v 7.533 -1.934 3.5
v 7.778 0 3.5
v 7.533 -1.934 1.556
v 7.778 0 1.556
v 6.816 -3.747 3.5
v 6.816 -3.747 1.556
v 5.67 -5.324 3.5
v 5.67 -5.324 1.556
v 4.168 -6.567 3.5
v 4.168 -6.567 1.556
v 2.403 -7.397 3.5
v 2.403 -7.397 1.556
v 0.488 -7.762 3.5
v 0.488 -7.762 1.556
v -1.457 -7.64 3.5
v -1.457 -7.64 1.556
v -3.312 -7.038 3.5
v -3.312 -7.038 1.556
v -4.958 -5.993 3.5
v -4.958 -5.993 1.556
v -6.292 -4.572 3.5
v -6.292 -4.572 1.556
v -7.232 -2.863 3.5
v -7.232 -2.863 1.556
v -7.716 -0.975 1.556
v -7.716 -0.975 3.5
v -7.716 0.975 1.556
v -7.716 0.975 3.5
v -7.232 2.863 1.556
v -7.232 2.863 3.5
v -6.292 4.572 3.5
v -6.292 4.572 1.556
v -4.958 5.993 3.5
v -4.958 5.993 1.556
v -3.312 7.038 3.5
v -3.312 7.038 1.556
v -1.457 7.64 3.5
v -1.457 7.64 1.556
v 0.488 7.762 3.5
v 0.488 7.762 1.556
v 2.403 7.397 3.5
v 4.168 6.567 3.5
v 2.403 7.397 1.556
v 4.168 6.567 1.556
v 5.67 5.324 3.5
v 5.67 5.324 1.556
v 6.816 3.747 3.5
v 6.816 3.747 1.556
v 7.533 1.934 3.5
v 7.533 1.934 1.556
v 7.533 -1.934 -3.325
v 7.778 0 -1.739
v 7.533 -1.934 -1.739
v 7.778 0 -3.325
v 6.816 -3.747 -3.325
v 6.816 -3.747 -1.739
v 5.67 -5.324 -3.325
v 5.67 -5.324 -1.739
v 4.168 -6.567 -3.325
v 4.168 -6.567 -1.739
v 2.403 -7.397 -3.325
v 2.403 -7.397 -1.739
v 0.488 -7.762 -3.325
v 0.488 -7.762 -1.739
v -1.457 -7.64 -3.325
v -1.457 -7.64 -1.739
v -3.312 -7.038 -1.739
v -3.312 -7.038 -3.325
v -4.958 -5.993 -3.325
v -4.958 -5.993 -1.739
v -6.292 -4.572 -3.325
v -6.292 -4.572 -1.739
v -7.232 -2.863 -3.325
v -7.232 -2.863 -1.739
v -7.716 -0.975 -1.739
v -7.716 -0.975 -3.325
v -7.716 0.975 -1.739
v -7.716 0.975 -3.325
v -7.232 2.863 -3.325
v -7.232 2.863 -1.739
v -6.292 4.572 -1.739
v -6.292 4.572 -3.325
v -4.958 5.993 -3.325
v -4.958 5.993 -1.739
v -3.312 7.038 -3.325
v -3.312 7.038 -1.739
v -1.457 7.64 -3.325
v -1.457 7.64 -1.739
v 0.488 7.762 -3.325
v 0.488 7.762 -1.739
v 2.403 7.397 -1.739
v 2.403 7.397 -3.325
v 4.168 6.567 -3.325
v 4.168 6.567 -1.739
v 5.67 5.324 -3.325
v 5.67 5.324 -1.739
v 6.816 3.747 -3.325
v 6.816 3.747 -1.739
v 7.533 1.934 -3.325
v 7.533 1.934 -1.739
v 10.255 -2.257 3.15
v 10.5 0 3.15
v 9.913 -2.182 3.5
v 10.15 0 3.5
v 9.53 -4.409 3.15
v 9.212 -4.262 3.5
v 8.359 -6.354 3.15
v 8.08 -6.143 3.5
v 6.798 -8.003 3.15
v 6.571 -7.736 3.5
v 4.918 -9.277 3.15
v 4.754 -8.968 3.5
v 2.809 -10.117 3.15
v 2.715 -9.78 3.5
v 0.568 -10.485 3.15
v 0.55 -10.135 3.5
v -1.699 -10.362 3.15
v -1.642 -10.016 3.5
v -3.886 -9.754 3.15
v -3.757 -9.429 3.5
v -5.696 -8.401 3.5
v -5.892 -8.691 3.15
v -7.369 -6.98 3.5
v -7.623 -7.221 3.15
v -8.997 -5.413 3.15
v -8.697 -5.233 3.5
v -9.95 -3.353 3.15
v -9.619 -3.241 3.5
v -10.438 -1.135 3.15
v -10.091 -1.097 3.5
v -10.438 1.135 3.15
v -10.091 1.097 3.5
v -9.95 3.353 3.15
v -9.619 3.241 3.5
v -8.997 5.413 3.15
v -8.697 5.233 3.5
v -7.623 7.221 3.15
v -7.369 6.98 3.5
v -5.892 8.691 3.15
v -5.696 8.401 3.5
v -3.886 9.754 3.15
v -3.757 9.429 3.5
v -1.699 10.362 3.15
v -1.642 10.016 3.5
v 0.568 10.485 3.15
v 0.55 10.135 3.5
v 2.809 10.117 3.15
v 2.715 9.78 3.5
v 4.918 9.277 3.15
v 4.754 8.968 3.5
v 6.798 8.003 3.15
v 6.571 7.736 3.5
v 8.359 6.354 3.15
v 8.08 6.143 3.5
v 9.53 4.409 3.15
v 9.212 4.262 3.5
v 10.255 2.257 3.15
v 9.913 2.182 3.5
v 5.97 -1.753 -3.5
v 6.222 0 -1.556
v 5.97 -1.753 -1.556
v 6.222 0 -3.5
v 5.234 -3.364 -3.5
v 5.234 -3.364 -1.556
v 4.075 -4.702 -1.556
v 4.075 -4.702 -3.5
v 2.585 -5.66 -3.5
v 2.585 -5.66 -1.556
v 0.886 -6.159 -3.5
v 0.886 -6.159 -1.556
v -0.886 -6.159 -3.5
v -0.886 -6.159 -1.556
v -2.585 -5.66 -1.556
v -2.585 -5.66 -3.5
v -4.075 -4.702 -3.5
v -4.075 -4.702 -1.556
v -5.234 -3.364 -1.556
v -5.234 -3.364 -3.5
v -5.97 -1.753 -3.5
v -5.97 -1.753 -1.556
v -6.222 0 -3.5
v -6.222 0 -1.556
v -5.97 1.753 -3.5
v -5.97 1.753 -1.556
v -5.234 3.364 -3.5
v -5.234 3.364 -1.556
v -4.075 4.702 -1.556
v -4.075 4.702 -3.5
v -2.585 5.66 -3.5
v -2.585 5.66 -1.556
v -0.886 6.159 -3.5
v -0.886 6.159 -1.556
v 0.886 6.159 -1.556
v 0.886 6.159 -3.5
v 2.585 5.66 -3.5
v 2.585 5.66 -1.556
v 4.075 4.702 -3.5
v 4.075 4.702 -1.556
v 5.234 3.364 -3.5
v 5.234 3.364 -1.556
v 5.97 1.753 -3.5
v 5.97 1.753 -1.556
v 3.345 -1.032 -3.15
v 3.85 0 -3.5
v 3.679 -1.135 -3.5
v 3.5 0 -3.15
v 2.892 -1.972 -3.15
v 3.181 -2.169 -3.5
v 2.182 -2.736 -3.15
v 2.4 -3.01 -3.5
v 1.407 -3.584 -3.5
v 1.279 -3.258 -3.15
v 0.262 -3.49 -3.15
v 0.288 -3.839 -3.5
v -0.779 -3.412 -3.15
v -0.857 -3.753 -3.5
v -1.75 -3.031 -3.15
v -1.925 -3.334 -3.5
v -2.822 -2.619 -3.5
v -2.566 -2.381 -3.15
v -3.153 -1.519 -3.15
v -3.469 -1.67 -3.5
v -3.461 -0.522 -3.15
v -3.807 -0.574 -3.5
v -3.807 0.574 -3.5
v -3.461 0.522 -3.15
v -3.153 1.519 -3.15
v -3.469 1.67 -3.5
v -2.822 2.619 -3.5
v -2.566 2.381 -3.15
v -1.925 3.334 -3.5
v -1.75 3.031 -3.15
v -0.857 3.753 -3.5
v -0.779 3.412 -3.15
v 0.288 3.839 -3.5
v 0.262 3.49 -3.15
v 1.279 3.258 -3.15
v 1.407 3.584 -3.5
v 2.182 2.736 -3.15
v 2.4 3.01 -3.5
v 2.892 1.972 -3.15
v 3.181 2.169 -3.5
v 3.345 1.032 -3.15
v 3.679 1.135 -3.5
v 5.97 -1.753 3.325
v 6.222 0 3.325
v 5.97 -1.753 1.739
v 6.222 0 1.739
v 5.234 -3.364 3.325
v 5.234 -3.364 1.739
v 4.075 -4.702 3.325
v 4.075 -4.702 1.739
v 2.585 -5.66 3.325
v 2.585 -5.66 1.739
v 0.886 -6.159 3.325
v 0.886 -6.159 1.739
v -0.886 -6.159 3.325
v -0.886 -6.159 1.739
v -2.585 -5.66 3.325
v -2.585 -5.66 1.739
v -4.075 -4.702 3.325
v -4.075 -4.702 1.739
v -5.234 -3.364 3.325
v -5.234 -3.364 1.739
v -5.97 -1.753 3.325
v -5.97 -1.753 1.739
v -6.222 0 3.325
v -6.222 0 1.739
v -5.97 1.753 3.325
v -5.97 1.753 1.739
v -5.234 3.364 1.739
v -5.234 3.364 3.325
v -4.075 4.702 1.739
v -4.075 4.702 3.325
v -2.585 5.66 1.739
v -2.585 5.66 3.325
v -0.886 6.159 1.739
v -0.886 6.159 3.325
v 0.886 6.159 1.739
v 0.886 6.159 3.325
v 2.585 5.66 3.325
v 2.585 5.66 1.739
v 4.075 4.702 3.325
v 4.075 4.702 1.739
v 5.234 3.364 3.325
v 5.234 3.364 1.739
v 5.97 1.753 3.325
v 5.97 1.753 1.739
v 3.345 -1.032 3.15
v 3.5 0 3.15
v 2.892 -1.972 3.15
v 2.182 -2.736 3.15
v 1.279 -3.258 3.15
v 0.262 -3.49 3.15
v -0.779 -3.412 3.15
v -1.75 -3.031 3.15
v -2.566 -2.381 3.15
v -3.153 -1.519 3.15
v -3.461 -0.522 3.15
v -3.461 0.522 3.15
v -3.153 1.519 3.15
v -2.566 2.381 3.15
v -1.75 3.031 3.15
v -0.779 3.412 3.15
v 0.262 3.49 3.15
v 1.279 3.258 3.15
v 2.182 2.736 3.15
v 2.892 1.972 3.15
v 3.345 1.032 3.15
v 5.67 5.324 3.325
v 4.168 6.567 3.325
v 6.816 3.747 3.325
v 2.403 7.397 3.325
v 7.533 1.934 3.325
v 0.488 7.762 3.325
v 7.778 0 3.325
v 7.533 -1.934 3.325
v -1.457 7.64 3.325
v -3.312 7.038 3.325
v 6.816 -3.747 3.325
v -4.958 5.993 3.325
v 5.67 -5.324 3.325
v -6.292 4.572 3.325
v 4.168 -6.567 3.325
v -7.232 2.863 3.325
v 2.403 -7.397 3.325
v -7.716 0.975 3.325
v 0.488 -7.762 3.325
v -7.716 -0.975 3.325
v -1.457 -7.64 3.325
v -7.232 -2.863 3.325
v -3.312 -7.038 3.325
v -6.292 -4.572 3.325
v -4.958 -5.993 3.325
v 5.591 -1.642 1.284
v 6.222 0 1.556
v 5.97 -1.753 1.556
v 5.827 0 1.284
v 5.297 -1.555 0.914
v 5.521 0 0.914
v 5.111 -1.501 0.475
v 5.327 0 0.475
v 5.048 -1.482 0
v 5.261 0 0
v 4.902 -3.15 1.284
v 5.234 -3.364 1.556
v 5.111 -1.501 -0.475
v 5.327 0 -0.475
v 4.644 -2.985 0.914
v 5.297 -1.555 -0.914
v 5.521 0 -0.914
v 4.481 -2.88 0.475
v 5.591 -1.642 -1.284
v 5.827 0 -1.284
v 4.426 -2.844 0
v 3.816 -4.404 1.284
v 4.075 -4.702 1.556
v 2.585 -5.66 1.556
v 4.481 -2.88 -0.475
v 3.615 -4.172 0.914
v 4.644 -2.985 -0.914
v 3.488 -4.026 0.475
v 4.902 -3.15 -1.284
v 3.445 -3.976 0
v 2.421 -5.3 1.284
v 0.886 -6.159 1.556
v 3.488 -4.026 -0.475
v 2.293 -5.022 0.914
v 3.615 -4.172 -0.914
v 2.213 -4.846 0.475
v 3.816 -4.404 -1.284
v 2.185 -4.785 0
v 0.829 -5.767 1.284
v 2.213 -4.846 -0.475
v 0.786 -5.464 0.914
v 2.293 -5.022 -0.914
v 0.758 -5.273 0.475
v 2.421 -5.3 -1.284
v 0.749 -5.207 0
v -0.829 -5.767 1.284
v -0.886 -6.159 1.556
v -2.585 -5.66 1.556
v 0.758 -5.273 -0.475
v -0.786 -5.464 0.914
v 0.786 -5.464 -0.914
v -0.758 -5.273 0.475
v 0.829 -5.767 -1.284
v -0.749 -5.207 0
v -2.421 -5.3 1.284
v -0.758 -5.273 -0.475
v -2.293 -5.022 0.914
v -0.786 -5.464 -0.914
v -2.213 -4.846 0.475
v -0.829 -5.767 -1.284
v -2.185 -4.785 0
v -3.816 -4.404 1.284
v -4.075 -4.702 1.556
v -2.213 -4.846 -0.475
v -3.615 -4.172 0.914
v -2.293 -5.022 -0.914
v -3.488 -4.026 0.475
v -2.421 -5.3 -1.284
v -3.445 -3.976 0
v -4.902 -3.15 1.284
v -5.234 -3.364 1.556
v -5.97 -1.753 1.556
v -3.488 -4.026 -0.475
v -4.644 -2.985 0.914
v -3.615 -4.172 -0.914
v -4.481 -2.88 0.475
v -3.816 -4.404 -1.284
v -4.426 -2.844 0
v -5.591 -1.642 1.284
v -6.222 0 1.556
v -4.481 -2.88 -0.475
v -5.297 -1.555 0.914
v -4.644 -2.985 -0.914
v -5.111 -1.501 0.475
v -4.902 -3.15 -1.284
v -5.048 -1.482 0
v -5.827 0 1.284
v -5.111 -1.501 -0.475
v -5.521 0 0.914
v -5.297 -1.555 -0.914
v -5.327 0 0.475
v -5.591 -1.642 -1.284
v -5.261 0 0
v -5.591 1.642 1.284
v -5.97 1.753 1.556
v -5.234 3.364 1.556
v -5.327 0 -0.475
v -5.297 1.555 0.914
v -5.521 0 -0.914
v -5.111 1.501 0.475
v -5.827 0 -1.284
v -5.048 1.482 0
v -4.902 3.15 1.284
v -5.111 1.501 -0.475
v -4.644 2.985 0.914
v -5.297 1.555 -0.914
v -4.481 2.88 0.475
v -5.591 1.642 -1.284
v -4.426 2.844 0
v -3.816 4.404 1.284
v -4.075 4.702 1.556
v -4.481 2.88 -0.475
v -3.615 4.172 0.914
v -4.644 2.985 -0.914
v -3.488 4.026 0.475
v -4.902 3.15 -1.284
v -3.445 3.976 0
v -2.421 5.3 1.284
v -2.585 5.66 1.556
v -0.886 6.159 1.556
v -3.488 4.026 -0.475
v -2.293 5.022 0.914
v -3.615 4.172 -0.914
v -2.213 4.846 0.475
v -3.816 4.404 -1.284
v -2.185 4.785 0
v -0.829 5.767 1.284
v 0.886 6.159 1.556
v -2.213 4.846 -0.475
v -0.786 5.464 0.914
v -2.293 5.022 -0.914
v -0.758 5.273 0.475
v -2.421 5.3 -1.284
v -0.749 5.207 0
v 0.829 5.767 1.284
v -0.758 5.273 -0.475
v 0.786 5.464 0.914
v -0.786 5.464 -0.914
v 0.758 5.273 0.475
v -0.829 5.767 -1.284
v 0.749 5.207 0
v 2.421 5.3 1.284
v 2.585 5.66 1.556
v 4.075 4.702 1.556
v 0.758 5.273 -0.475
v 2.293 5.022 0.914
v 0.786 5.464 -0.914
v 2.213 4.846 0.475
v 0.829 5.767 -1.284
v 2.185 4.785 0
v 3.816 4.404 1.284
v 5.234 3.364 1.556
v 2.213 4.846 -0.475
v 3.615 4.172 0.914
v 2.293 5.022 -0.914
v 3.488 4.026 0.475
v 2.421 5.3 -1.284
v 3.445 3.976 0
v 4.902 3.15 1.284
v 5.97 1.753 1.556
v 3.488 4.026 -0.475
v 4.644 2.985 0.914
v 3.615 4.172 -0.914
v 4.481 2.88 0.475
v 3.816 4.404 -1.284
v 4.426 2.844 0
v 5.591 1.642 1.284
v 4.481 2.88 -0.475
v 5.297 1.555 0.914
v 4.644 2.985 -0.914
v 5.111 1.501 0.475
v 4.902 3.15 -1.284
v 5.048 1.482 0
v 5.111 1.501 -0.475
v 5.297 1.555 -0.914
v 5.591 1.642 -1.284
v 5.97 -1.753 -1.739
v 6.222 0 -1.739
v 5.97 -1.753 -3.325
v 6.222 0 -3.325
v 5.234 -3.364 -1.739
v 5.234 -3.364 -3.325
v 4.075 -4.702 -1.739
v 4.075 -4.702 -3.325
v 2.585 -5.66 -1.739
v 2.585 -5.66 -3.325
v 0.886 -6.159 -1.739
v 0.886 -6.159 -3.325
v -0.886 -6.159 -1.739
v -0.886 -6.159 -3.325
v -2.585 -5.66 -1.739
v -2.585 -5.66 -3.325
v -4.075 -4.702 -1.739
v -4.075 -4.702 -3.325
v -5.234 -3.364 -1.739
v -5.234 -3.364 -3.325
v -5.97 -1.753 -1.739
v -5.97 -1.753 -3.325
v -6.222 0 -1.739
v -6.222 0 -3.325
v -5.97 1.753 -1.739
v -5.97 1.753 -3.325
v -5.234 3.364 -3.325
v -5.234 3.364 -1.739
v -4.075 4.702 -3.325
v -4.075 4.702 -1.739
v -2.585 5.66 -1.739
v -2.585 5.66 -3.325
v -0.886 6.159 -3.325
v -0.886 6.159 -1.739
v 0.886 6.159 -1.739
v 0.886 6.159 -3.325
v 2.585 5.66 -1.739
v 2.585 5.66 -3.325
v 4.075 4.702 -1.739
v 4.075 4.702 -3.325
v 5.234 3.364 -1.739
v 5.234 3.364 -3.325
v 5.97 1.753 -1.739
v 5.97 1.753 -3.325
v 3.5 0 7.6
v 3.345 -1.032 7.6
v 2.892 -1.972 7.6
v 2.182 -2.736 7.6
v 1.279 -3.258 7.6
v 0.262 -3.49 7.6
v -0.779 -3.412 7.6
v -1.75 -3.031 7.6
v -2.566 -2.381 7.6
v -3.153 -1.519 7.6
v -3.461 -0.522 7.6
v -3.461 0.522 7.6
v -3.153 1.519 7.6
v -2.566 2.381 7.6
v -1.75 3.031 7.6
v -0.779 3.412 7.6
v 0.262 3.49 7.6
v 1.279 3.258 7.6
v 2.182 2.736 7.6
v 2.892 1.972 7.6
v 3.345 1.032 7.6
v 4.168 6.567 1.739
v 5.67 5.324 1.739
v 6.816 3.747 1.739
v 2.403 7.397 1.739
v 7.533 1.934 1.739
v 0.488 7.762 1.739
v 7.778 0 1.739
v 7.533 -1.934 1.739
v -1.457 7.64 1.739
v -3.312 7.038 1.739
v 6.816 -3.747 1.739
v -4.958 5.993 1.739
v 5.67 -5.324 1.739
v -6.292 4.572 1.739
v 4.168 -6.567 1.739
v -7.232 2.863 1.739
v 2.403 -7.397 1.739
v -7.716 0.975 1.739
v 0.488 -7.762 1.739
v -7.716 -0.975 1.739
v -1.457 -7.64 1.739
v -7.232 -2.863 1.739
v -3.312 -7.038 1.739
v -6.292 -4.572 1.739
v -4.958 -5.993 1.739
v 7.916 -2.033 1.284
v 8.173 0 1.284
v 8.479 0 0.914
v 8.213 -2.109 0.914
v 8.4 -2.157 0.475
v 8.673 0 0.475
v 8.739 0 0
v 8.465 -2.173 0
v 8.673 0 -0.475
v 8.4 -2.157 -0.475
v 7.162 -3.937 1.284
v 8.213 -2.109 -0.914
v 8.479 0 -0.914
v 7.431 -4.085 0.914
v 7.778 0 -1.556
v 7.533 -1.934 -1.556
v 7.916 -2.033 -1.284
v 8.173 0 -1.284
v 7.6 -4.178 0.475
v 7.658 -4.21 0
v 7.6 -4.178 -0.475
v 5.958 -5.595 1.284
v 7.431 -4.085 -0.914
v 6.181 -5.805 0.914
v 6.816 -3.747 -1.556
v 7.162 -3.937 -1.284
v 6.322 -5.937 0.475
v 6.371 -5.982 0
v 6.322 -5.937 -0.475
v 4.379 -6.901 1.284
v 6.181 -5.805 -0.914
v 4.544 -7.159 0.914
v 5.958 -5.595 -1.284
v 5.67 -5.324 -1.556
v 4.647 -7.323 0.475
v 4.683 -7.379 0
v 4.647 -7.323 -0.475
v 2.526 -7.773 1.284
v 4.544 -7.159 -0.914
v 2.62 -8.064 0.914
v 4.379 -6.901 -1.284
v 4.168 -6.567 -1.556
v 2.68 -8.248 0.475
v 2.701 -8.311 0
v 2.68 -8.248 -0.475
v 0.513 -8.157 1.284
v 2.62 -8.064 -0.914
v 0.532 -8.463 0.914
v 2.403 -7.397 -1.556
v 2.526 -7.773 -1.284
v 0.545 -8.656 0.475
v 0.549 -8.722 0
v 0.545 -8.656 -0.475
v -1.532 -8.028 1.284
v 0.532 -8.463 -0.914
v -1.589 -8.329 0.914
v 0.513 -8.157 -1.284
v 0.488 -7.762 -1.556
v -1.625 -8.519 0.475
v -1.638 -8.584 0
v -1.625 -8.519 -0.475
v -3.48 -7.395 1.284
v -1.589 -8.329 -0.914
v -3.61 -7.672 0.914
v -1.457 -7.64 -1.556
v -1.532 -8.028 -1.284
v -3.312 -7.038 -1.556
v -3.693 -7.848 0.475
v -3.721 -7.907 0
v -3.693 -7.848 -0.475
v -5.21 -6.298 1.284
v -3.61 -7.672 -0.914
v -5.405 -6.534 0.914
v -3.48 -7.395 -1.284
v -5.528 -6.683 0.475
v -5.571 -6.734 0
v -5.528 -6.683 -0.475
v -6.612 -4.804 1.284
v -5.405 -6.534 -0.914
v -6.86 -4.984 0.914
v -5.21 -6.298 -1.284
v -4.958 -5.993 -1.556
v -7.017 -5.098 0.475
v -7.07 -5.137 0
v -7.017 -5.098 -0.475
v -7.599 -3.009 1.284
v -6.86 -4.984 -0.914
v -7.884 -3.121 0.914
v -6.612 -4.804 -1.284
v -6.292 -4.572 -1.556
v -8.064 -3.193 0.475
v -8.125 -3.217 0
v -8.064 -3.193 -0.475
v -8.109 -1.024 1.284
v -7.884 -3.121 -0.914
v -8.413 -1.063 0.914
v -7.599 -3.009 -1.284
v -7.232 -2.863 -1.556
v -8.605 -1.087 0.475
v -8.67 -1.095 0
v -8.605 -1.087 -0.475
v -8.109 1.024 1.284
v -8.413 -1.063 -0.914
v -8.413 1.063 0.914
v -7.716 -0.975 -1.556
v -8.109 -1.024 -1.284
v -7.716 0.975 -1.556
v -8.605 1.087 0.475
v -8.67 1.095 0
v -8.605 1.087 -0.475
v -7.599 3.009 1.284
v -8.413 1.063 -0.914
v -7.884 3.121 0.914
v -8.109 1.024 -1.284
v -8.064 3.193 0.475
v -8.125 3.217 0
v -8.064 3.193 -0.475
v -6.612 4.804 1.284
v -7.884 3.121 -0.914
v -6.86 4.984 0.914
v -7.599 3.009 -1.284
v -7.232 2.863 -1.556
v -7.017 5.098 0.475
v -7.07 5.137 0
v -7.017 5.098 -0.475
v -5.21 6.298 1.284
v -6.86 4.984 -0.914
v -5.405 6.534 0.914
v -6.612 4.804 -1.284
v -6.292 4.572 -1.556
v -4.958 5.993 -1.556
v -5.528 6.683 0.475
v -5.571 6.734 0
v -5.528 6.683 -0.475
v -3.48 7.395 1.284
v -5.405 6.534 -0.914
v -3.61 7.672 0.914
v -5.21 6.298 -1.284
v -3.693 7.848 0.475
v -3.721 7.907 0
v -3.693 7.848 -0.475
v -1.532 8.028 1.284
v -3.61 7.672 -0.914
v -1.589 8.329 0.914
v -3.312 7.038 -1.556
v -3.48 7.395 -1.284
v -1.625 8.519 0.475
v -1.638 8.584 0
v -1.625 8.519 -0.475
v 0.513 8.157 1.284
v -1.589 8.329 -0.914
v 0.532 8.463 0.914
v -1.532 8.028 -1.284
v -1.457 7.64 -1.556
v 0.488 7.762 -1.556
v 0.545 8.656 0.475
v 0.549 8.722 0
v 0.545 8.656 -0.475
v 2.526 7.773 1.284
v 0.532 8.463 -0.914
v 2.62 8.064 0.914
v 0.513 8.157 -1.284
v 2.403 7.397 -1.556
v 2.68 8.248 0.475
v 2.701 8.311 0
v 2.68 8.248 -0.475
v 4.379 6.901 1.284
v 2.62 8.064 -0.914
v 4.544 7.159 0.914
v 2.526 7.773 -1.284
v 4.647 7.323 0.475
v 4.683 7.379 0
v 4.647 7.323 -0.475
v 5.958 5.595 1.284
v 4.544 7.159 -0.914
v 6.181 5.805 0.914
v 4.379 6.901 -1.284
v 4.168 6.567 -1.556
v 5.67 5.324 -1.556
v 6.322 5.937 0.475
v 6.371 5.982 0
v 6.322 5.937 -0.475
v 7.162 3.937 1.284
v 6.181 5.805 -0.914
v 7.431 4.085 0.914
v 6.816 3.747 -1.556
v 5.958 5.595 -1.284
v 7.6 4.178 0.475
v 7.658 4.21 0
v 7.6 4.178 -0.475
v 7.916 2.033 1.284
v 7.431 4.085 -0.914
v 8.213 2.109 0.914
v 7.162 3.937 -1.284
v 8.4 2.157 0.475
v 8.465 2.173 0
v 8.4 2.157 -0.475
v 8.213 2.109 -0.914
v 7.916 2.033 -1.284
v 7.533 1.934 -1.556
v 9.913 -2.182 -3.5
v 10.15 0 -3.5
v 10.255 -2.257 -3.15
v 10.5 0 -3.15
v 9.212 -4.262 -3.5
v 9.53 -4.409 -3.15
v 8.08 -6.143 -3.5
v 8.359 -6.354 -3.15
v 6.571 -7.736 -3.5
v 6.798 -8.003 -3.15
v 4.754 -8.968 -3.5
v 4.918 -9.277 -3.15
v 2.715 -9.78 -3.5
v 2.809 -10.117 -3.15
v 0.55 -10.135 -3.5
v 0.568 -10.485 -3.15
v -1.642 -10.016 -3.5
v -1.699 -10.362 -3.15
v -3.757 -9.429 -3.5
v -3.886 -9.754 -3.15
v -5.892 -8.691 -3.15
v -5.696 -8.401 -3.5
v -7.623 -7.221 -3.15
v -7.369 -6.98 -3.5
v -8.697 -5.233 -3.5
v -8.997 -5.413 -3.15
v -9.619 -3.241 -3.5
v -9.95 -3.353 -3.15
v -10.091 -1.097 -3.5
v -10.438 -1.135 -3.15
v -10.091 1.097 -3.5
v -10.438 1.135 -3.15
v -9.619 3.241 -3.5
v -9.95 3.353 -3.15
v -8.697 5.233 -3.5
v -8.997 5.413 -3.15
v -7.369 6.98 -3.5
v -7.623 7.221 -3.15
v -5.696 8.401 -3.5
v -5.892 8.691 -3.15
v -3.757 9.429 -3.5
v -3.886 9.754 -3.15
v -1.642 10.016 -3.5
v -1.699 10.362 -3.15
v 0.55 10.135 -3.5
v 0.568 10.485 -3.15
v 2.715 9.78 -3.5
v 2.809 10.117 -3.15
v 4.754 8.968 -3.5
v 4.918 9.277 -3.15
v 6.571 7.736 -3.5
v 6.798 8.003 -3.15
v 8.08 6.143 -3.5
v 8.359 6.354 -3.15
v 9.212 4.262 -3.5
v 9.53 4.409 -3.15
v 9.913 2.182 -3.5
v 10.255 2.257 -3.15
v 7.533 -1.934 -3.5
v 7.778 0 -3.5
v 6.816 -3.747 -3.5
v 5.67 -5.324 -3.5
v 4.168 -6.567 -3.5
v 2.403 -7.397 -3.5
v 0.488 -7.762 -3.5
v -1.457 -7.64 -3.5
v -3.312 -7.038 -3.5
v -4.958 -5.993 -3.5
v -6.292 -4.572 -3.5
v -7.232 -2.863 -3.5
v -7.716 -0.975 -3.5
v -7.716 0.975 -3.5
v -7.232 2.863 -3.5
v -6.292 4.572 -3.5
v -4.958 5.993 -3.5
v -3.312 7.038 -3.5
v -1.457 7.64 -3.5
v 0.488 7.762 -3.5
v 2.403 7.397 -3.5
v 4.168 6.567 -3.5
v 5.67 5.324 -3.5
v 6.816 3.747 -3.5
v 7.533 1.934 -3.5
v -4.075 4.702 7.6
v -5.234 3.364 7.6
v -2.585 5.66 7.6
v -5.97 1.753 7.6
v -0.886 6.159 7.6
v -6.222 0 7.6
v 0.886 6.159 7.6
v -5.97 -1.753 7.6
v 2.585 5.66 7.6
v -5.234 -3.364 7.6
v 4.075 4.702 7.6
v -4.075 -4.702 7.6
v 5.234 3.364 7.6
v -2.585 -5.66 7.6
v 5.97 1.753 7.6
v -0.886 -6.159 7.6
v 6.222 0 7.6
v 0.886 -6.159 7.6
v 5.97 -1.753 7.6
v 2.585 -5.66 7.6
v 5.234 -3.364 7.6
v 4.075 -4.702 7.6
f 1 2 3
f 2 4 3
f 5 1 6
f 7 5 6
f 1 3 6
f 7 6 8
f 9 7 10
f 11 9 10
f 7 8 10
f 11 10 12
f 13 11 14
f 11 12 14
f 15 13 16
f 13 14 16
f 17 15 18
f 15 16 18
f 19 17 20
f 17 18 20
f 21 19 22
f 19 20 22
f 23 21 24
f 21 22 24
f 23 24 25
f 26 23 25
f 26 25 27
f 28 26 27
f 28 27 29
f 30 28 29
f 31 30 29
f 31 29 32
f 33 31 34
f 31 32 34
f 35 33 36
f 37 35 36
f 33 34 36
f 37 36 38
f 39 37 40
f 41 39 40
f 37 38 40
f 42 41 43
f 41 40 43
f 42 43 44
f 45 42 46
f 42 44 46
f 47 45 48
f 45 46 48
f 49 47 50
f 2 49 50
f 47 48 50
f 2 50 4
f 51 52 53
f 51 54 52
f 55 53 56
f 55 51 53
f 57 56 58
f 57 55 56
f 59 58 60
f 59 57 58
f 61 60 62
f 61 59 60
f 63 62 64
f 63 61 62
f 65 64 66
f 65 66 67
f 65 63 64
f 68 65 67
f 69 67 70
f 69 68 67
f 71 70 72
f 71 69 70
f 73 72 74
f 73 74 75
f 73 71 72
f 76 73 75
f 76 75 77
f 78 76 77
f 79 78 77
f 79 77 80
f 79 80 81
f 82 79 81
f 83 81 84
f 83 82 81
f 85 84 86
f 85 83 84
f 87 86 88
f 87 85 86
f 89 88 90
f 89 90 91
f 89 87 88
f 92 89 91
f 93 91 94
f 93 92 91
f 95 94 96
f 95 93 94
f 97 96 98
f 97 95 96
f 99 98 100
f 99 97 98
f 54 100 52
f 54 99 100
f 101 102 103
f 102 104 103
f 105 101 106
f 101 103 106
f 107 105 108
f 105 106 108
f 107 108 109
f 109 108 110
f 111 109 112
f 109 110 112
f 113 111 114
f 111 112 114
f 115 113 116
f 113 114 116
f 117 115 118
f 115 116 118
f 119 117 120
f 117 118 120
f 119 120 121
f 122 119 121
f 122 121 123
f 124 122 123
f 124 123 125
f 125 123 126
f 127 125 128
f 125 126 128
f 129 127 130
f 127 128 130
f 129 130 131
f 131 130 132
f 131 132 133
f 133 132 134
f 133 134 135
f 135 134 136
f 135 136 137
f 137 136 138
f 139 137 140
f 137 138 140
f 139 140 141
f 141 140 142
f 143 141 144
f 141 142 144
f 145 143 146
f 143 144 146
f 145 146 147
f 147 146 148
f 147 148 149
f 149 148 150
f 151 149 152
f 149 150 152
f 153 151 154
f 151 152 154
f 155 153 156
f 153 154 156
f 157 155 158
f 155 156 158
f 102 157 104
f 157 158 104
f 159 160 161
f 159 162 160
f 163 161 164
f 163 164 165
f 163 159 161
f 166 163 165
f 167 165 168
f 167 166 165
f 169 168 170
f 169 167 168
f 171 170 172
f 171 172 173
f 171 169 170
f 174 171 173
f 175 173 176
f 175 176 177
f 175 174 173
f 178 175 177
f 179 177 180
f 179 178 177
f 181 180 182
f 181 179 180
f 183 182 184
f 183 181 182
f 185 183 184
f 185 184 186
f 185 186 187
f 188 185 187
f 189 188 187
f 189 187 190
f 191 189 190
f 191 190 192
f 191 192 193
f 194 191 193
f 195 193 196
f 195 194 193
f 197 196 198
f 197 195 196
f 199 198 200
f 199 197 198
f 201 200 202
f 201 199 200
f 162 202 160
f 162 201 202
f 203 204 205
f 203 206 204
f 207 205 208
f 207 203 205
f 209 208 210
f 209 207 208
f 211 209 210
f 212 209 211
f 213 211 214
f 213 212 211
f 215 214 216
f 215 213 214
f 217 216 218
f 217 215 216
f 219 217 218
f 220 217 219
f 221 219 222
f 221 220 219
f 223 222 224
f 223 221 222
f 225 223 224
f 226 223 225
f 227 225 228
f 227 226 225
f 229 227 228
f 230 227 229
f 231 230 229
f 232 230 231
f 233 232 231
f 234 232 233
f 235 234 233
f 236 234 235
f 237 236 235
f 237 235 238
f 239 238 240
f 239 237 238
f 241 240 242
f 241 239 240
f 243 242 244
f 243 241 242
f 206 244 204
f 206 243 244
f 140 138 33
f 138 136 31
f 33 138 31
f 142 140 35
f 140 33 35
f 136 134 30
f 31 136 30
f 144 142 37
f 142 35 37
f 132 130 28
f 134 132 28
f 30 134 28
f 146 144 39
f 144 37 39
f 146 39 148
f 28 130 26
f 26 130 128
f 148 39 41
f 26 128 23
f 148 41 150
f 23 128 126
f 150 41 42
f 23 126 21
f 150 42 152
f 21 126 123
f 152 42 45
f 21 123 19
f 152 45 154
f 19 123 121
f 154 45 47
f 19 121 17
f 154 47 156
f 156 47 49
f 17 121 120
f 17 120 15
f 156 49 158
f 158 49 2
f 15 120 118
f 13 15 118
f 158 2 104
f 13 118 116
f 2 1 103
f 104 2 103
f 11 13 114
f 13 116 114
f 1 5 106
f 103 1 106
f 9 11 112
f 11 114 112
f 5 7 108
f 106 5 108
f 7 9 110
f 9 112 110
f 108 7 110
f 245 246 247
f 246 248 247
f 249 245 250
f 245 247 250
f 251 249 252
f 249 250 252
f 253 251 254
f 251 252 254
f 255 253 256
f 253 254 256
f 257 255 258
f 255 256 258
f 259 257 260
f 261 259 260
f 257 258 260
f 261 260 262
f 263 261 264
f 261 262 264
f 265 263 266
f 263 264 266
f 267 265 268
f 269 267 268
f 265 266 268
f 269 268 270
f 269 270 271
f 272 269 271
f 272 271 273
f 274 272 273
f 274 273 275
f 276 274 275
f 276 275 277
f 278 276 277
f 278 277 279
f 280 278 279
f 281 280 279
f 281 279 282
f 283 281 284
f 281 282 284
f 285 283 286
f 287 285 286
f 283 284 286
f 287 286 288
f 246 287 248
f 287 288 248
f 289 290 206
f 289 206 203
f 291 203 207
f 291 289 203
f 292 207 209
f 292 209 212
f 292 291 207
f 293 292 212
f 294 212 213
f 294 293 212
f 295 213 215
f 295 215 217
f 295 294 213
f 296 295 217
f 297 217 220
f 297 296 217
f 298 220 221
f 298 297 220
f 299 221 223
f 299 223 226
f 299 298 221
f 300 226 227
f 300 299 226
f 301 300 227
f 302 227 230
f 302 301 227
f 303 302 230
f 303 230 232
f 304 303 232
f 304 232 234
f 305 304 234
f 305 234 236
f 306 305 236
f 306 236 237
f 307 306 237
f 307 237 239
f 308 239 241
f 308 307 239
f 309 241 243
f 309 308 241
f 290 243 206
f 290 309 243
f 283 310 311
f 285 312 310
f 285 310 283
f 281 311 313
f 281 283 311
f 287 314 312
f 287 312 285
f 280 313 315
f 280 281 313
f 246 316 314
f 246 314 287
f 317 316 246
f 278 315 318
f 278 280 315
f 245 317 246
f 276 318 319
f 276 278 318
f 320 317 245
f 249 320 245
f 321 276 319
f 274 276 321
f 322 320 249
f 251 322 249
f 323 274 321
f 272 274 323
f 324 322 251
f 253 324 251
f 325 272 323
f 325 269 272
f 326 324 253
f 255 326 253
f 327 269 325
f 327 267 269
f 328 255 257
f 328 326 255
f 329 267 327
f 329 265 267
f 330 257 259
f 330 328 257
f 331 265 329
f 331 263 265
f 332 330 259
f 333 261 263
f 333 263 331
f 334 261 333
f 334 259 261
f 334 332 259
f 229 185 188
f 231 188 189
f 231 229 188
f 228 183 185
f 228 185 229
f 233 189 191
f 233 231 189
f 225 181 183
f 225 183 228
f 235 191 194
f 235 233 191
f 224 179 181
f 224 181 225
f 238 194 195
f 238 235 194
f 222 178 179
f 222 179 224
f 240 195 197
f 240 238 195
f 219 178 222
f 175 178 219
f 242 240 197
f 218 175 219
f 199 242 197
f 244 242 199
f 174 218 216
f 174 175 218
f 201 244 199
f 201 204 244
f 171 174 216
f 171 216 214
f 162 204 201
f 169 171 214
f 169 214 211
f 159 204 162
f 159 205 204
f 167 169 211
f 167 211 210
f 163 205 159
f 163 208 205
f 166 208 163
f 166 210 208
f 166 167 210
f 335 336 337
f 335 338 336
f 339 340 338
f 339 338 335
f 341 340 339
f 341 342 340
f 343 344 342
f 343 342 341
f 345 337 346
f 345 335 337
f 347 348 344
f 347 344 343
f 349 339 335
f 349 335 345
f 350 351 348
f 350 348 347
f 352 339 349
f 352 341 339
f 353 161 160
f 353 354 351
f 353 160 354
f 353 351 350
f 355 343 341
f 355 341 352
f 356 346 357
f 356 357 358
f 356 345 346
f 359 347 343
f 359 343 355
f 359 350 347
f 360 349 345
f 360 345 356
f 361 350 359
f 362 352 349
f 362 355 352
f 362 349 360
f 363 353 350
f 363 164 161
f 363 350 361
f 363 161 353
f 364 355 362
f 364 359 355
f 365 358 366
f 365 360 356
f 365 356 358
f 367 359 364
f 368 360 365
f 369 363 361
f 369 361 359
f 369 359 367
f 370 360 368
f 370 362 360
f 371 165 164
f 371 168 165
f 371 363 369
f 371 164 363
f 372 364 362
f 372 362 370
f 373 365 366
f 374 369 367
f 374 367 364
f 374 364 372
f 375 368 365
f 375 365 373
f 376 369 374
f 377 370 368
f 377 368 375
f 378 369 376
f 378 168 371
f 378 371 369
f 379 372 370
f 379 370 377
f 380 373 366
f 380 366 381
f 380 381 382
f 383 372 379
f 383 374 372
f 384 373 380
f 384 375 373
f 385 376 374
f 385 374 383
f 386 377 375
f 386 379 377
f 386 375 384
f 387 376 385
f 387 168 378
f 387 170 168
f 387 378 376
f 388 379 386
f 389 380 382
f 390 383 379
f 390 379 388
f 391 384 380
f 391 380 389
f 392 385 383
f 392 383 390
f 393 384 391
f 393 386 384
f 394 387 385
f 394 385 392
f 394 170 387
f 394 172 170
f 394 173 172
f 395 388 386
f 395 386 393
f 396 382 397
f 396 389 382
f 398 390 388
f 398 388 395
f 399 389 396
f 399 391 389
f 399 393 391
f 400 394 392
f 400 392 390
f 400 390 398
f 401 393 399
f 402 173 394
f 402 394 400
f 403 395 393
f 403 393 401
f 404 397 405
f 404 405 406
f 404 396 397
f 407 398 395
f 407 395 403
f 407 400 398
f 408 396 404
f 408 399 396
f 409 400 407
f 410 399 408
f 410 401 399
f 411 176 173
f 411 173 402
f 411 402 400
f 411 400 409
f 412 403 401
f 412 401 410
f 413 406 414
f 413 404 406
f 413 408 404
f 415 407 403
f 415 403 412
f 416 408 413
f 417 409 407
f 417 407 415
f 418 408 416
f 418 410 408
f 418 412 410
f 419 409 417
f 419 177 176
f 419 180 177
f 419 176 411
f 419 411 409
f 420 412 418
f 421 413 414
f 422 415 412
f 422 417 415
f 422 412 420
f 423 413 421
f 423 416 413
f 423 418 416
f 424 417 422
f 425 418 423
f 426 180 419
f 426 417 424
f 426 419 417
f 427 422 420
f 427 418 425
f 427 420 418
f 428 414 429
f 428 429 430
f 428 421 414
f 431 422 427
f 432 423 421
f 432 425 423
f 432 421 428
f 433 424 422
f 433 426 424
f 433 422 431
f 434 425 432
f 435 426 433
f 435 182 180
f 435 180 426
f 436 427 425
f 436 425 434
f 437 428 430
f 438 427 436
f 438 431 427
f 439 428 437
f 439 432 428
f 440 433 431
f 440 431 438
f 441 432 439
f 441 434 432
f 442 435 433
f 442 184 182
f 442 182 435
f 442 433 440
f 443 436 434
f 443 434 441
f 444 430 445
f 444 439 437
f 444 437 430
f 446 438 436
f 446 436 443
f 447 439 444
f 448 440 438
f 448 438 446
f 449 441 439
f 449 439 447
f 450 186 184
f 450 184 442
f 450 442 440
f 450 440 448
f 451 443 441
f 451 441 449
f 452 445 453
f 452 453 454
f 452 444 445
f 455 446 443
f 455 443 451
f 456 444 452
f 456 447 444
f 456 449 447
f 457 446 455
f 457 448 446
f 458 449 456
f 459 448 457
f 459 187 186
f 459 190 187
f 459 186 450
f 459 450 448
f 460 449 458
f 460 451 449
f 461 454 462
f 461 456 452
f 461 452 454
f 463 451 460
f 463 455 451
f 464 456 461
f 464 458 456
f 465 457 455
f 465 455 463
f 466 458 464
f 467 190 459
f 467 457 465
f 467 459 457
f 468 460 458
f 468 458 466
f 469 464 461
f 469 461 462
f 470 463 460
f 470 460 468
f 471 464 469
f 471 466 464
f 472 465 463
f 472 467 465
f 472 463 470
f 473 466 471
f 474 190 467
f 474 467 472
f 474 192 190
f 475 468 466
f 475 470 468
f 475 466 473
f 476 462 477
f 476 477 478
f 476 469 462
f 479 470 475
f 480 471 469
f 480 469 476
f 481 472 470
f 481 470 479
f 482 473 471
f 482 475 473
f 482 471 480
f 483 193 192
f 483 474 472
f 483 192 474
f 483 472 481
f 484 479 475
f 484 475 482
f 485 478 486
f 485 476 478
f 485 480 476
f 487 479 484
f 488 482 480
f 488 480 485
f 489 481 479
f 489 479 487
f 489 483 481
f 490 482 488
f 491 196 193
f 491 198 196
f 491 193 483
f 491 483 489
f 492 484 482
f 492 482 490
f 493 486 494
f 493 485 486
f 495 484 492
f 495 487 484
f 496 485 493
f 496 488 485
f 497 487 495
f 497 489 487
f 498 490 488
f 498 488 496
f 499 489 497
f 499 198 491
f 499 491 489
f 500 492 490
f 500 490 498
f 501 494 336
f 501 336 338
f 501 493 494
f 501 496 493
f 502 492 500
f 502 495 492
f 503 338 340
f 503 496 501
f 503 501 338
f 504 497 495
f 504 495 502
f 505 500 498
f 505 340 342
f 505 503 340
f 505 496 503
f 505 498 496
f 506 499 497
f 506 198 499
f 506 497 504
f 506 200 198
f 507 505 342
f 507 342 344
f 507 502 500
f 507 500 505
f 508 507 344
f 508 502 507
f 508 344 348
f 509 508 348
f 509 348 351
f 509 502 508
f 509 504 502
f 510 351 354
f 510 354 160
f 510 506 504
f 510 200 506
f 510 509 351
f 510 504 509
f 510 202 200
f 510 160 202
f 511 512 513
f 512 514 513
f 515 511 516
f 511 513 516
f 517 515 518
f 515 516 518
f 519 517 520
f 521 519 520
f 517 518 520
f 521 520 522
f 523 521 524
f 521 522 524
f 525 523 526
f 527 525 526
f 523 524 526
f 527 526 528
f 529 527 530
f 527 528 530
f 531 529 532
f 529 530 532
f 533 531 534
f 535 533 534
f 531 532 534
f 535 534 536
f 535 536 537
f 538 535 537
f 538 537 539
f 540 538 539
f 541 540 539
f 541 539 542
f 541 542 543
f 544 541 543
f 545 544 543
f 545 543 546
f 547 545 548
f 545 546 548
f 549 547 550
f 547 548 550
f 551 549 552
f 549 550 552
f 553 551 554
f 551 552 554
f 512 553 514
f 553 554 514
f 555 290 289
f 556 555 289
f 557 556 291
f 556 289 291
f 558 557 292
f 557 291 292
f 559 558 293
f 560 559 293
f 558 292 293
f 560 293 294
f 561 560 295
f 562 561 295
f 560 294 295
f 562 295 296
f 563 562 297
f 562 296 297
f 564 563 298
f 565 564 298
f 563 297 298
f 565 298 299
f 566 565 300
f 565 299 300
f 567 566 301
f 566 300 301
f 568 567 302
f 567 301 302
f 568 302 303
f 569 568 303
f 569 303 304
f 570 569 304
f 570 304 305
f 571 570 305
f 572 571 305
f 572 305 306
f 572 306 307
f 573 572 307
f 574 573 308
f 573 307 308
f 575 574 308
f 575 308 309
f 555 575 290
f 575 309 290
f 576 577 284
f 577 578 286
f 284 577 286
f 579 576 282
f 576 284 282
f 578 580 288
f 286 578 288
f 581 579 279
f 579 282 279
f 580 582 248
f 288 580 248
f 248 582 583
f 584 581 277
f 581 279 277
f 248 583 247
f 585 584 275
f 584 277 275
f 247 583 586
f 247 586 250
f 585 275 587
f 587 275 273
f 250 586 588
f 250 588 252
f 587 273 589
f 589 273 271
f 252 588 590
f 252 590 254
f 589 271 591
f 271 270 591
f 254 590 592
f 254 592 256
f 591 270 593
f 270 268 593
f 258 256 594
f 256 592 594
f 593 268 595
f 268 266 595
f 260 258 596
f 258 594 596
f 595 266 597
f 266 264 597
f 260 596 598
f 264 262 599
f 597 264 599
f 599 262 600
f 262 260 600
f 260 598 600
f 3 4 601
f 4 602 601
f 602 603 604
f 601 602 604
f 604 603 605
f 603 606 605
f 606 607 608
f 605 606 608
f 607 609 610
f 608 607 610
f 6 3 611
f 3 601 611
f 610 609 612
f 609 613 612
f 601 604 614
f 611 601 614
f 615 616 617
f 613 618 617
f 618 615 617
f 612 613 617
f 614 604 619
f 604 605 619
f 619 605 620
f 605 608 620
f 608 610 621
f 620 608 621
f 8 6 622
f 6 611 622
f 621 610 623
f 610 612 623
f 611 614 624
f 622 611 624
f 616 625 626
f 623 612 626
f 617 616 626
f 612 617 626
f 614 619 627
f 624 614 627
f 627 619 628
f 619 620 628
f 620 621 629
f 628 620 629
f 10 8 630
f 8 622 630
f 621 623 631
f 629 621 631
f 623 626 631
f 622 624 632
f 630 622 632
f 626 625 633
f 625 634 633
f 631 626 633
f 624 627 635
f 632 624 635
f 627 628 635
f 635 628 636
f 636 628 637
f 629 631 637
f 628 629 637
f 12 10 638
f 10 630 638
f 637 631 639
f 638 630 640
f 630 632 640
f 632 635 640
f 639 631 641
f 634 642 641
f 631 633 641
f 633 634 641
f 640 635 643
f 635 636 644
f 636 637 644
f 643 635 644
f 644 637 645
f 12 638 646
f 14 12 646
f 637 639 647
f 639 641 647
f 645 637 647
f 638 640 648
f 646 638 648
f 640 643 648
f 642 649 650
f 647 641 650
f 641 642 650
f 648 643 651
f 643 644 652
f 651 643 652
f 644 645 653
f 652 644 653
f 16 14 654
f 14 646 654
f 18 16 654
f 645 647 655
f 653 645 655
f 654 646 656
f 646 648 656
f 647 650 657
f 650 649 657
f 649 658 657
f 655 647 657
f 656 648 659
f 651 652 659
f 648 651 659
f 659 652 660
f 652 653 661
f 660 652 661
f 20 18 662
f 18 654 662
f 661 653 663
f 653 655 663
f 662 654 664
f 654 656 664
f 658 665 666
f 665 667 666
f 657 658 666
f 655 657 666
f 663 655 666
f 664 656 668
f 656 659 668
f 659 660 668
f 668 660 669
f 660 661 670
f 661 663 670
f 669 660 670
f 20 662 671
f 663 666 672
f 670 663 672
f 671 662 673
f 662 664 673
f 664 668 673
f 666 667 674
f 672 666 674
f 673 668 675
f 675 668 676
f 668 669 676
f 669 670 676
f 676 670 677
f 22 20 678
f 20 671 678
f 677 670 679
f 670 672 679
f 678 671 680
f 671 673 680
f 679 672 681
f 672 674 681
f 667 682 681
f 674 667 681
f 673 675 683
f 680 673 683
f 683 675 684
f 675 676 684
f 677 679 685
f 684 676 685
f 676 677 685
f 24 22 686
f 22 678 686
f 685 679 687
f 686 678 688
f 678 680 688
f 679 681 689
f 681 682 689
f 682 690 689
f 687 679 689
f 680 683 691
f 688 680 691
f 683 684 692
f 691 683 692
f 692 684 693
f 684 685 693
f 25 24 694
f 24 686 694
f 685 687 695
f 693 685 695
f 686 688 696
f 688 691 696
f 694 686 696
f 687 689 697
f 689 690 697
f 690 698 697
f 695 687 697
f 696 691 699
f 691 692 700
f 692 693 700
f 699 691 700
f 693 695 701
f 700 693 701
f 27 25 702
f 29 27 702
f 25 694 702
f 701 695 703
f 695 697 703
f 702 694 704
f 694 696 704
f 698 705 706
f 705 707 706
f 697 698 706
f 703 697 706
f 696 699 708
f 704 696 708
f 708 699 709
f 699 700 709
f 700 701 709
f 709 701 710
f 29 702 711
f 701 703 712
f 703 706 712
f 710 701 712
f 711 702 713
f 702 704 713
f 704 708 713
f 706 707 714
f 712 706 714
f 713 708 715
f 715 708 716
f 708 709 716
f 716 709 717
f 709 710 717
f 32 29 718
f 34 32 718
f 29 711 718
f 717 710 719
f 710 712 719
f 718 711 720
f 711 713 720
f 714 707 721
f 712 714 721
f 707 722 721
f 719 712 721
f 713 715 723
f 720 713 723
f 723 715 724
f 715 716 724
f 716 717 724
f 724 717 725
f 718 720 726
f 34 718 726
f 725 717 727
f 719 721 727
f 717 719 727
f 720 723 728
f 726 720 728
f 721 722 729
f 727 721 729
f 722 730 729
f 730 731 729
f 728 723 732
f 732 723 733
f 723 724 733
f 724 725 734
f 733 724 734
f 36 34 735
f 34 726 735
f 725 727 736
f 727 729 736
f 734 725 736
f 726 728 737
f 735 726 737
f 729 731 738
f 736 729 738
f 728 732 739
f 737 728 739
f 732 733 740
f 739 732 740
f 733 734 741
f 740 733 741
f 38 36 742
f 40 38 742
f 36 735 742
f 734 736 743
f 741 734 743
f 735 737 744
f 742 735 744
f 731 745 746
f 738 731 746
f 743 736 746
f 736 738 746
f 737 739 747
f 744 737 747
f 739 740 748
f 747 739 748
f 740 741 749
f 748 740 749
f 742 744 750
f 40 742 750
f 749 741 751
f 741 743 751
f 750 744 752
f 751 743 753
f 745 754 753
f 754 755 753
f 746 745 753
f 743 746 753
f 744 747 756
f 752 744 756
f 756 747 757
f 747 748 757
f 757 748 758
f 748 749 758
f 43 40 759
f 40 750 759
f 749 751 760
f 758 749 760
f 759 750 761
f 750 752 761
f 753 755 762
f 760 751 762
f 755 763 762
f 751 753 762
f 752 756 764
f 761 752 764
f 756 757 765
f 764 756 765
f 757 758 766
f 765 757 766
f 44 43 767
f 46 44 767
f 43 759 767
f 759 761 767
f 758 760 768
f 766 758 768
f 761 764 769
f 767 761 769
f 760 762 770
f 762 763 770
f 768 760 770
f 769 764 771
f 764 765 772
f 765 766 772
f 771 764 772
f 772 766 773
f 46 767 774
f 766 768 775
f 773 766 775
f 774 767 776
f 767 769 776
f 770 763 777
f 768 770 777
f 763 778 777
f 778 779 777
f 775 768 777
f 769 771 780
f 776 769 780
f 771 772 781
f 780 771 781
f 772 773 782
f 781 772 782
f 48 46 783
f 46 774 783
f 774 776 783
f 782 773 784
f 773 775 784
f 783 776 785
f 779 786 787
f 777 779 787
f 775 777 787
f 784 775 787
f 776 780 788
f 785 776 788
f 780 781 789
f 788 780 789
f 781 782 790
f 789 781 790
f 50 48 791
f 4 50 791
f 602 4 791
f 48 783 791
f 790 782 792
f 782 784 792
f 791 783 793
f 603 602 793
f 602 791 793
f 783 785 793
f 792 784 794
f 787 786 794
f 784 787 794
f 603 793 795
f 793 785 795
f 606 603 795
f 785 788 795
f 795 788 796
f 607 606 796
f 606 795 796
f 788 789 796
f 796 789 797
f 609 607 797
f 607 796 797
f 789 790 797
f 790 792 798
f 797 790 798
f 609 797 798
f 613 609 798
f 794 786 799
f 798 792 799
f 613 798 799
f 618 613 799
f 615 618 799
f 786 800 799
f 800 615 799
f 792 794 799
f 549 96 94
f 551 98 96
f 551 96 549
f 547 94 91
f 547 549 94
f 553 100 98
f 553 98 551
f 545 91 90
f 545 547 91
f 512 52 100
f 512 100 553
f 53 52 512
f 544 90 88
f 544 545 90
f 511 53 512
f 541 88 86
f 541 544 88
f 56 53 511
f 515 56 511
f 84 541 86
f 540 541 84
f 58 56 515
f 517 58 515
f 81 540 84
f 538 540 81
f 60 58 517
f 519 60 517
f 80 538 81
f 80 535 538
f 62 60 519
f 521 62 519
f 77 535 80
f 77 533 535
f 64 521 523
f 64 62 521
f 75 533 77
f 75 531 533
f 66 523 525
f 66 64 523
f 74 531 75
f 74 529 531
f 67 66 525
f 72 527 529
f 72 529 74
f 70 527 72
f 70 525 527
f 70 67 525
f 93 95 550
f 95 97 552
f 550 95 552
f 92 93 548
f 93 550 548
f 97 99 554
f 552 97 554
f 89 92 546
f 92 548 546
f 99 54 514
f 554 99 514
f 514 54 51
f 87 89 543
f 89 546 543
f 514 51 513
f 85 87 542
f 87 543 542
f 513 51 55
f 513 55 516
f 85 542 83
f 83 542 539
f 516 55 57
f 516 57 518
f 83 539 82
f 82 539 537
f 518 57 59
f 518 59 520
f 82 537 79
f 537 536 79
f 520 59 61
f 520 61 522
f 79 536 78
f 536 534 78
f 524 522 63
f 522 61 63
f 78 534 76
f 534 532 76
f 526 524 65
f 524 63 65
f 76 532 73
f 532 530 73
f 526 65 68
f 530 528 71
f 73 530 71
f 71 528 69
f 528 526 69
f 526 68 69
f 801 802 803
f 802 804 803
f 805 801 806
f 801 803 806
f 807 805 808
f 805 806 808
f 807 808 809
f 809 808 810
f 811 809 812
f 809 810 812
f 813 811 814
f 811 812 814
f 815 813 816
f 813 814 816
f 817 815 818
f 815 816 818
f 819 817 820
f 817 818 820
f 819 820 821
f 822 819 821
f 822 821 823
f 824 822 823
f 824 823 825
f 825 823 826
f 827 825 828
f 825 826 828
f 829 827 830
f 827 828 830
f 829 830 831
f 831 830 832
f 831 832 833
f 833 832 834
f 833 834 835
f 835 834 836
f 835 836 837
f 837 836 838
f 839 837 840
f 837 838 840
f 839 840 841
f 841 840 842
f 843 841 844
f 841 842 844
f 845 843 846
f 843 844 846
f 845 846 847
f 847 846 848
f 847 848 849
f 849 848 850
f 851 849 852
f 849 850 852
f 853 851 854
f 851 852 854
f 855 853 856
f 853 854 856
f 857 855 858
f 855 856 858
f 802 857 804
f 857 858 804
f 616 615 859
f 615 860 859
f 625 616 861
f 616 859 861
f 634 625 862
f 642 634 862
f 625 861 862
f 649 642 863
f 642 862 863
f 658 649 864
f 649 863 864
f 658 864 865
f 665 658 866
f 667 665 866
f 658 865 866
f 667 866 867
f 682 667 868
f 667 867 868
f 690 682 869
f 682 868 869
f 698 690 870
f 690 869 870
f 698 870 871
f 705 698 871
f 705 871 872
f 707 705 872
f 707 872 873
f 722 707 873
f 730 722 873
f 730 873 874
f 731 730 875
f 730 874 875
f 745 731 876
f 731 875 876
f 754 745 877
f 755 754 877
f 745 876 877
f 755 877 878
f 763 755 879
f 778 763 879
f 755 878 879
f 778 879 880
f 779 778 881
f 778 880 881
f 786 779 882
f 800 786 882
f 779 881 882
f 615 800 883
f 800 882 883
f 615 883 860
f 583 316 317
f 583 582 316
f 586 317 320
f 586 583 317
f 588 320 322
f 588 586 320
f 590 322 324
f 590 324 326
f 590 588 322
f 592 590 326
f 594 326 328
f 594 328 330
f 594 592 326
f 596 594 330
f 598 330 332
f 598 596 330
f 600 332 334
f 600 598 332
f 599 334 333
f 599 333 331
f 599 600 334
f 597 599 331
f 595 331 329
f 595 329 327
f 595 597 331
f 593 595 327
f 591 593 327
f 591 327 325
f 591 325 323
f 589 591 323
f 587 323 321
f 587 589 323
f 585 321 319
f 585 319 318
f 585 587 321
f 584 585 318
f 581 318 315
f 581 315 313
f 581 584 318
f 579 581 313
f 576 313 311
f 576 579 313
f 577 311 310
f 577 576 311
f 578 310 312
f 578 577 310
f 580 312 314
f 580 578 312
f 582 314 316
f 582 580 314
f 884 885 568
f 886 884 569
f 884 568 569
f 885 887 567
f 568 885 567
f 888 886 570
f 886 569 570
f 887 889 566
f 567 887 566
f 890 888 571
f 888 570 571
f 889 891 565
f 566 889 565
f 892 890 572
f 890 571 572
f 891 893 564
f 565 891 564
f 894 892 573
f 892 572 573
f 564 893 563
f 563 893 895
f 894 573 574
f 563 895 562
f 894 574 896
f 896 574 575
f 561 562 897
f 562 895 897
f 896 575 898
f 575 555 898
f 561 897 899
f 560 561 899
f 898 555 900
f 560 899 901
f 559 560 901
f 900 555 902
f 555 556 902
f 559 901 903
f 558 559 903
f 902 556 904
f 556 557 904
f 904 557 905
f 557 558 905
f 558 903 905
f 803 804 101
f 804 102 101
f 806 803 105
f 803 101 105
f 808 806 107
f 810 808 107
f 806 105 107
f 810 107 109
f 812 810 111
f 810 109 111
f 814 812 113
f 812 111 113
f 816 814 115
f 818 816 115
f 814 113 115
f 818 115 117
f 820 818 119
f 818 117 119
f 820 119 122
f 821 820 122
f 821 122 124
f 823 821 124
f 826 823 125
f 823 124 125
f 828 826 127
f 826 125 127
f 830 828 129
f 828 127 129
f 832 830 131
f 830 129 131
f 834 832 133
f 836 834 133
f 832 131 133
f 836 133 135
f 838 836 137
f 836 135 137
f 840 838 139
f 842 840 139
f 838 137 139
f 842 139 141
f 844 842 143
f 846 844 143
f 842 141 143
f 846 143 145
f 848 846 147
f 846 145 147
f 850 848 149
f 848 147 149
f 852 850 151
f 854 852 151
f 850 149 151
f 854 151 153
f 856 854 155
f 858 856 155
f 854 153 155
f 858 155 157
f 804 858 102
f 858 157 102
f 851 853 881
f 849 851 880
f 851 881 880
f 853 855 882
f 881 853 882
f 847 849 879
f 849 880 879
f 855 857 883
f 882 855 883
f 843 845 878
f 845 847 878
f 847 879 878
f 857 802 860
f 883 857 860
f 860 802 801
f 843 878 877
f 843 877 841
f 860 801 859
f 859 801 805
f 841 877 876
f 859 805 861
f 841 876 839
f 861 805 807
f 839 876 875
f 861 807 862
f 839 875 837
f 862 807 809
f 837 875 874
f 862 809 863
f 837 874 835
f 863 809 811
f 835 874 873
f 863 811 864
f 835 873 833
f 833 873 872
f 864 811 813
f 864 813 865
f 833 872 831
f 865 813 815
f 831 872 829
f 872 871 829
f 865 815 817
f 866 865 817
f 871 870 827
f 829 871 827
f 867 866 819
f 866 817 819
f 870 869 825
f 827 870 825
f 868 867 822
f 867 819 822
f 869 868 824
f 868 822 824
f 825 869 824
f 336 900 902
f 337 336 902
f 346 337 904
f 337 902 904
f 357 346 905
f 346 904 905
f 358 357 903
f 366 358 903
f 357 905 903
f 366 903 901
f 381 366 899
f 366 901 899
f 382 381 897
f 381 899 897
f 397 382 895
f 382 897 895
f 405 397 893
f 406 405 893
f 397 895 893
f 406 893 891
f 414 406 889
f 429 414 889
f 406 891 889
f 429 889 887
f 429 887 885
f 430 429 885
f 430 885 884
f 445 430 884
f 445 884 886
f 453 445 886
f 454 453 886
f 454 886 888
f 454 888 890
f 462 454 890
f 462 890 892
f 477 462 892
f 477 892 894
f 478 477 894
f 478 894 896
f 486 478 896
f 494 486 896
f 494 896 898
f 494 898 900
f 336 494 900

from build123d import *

# Parameters (mm, degrees)
COVER_1_SKETCH_W = 1.585836018
COVER_1_SKETCH_H = 1.555555556
COVER_2_SKETCH_W = 1.585836018
COVER_2_SKETCH_H = 1.555555556


with BuildPart() as part:
    # Outter Chase Sketch → Outter Chase Revolve (revolve)
    with BuildSketch(Plane(origin=(0, 0, 0), x_dir=(0, 0, -1), z_dir=(1, 0, 0)), mode=Mode.PRIVATE) as outter_chase_revolve_sk:
        with BuildLine():
            Line((3.15, 10.5), (-3.15, 10.5))
            Line((-3.15, 10.5), (-3.5, 10.15))
            Line((-3.5, 10.15), (-3.5, 7.777777778))
            Line((-3.5, 7.777777778), (-1.555555556, 7.777777778))
            ThreePointArc((-1.555555556, 7.777777778), (0, 8.739163982), (1.555555556, 7.777777778))
            Line((1.555555556, 7.777777778), (3.5, 7.777777778))
            Line((3.5, 7.777777778), (3.5, 10.15))
            Line((3.5, 10.15), (3.15, 10.5))
        make_face()
    revolve(outter_chase_revolve_sk.sketch.rotate(Axis((0, 0, 3.5), (0, 0, -1)), 90), axis=Axis((0, 0, 3.5), (0, 0, -1)))


with BuildPart() as body_2:
    # Inner Chase Sketch → Inner Chase Revolve (revolve)
    with BuildSketch(Plane(origin=(0, 0, 0), x_dir=(0, 0, -1), z_dir=(1, 0, 0)), mode=Mode.PRIVATE) as inner_chase_revolve_sk:
        with BuildLine():
            Line((-3.5, 6.222222222), (-1.555555556, 6.222222222))
            ThreePointArc((-1.555555556, 6.222222222), (0, 5.260836018), (1.555555556, 6.222222222))
            Line((1.555555556, 6.222222222), (3.5, 6.222222222))
            Line((3.5, 6.222222222), (3.5, 3.85))
            Line((3.5, 3.85), (3.15, 3.5))
            Line((3.15, 3.5), (-3.15, 3.5))
            Line((-3.15, 3.5), (-3.5, 3.85))
            Line((-3.5, 3.85), (-3.5, 6.222222222))
        make_face()
    revolve(inner_chase_revolve_sk.sketch.rotate(Axis((0, 0, 3.5), (0, 0, -1)), 90), axis=Axis((0, 0, 3.5), (0, 0, -1)))

    # Flange Sketch → Flange Revolve (revolve)
    with BuildSketch(Plane(origin=(0, 0, 0), x_dir=(0, 0, -1), z_dir=(1, 0, 0)), mode=Mode.PRIVATE) as flange_revolve_sk:
        Polygon((-3.15, 3.5), (-3.5, 3.85), (-3.5, 6.222222222), (-7.6, 6.222222222), (-7.6, 3.5), align=None)
    revolve(flange_revolve_sk.sketch.rotate(Axis((0, 0, 3.5), (0, 0, -1)), 90), axis=Axis((0, 0, 3.5), (0, 0, -1)))


with BuildPart() as body_3:
    # Cover 1 Sketch → Cover 1 Revolve (revolve)
    with BuildSketch(Plane(origin=(0, 0, 0), x_dir=(0, 0, -1), z_dir=(1, 0, 0)), mode=Mode.PRIVATE) as cover_1_revolve_sk:
        with Locations((-2.532081991, 7)):
            Rectangle(COVER_1_SKETCH_W, COVER_1_SKETCH_H)
    revolve(cover_1_revolve_sk.sketch.rotate(Axis((0, 0, 3.5), (0, 0, -1)), 90), axis=Axis((0, 0, 3.5), (0, 0, -1)))


with BuildPart() as body_4:
    # Cover 2 Sketch → Cover 2 Revolve (revolve)
    with BuildSketch(Plane(origin=(0, 0, 0), x_dir=(0, 0, -1), z_dir=(1, 0, 0)), mode=Mode.PRIVATE) as cover_2_revolve_sk:
        with Locations((2.532081991, 7)):
            Rectangle(COVER_2_SKETCH_W, COVER_2_SKETCH_H)
    revolve(cover_2_revolve_sk.sketch.rotate(Axis((0, 0, 3.5), (0, 0, -1)), 90), axis=Axis((0, 0, 3.5), (0, 0, -1)))


solid = Compound([part.part, body_2.part, body_3.part, body_4.part])
